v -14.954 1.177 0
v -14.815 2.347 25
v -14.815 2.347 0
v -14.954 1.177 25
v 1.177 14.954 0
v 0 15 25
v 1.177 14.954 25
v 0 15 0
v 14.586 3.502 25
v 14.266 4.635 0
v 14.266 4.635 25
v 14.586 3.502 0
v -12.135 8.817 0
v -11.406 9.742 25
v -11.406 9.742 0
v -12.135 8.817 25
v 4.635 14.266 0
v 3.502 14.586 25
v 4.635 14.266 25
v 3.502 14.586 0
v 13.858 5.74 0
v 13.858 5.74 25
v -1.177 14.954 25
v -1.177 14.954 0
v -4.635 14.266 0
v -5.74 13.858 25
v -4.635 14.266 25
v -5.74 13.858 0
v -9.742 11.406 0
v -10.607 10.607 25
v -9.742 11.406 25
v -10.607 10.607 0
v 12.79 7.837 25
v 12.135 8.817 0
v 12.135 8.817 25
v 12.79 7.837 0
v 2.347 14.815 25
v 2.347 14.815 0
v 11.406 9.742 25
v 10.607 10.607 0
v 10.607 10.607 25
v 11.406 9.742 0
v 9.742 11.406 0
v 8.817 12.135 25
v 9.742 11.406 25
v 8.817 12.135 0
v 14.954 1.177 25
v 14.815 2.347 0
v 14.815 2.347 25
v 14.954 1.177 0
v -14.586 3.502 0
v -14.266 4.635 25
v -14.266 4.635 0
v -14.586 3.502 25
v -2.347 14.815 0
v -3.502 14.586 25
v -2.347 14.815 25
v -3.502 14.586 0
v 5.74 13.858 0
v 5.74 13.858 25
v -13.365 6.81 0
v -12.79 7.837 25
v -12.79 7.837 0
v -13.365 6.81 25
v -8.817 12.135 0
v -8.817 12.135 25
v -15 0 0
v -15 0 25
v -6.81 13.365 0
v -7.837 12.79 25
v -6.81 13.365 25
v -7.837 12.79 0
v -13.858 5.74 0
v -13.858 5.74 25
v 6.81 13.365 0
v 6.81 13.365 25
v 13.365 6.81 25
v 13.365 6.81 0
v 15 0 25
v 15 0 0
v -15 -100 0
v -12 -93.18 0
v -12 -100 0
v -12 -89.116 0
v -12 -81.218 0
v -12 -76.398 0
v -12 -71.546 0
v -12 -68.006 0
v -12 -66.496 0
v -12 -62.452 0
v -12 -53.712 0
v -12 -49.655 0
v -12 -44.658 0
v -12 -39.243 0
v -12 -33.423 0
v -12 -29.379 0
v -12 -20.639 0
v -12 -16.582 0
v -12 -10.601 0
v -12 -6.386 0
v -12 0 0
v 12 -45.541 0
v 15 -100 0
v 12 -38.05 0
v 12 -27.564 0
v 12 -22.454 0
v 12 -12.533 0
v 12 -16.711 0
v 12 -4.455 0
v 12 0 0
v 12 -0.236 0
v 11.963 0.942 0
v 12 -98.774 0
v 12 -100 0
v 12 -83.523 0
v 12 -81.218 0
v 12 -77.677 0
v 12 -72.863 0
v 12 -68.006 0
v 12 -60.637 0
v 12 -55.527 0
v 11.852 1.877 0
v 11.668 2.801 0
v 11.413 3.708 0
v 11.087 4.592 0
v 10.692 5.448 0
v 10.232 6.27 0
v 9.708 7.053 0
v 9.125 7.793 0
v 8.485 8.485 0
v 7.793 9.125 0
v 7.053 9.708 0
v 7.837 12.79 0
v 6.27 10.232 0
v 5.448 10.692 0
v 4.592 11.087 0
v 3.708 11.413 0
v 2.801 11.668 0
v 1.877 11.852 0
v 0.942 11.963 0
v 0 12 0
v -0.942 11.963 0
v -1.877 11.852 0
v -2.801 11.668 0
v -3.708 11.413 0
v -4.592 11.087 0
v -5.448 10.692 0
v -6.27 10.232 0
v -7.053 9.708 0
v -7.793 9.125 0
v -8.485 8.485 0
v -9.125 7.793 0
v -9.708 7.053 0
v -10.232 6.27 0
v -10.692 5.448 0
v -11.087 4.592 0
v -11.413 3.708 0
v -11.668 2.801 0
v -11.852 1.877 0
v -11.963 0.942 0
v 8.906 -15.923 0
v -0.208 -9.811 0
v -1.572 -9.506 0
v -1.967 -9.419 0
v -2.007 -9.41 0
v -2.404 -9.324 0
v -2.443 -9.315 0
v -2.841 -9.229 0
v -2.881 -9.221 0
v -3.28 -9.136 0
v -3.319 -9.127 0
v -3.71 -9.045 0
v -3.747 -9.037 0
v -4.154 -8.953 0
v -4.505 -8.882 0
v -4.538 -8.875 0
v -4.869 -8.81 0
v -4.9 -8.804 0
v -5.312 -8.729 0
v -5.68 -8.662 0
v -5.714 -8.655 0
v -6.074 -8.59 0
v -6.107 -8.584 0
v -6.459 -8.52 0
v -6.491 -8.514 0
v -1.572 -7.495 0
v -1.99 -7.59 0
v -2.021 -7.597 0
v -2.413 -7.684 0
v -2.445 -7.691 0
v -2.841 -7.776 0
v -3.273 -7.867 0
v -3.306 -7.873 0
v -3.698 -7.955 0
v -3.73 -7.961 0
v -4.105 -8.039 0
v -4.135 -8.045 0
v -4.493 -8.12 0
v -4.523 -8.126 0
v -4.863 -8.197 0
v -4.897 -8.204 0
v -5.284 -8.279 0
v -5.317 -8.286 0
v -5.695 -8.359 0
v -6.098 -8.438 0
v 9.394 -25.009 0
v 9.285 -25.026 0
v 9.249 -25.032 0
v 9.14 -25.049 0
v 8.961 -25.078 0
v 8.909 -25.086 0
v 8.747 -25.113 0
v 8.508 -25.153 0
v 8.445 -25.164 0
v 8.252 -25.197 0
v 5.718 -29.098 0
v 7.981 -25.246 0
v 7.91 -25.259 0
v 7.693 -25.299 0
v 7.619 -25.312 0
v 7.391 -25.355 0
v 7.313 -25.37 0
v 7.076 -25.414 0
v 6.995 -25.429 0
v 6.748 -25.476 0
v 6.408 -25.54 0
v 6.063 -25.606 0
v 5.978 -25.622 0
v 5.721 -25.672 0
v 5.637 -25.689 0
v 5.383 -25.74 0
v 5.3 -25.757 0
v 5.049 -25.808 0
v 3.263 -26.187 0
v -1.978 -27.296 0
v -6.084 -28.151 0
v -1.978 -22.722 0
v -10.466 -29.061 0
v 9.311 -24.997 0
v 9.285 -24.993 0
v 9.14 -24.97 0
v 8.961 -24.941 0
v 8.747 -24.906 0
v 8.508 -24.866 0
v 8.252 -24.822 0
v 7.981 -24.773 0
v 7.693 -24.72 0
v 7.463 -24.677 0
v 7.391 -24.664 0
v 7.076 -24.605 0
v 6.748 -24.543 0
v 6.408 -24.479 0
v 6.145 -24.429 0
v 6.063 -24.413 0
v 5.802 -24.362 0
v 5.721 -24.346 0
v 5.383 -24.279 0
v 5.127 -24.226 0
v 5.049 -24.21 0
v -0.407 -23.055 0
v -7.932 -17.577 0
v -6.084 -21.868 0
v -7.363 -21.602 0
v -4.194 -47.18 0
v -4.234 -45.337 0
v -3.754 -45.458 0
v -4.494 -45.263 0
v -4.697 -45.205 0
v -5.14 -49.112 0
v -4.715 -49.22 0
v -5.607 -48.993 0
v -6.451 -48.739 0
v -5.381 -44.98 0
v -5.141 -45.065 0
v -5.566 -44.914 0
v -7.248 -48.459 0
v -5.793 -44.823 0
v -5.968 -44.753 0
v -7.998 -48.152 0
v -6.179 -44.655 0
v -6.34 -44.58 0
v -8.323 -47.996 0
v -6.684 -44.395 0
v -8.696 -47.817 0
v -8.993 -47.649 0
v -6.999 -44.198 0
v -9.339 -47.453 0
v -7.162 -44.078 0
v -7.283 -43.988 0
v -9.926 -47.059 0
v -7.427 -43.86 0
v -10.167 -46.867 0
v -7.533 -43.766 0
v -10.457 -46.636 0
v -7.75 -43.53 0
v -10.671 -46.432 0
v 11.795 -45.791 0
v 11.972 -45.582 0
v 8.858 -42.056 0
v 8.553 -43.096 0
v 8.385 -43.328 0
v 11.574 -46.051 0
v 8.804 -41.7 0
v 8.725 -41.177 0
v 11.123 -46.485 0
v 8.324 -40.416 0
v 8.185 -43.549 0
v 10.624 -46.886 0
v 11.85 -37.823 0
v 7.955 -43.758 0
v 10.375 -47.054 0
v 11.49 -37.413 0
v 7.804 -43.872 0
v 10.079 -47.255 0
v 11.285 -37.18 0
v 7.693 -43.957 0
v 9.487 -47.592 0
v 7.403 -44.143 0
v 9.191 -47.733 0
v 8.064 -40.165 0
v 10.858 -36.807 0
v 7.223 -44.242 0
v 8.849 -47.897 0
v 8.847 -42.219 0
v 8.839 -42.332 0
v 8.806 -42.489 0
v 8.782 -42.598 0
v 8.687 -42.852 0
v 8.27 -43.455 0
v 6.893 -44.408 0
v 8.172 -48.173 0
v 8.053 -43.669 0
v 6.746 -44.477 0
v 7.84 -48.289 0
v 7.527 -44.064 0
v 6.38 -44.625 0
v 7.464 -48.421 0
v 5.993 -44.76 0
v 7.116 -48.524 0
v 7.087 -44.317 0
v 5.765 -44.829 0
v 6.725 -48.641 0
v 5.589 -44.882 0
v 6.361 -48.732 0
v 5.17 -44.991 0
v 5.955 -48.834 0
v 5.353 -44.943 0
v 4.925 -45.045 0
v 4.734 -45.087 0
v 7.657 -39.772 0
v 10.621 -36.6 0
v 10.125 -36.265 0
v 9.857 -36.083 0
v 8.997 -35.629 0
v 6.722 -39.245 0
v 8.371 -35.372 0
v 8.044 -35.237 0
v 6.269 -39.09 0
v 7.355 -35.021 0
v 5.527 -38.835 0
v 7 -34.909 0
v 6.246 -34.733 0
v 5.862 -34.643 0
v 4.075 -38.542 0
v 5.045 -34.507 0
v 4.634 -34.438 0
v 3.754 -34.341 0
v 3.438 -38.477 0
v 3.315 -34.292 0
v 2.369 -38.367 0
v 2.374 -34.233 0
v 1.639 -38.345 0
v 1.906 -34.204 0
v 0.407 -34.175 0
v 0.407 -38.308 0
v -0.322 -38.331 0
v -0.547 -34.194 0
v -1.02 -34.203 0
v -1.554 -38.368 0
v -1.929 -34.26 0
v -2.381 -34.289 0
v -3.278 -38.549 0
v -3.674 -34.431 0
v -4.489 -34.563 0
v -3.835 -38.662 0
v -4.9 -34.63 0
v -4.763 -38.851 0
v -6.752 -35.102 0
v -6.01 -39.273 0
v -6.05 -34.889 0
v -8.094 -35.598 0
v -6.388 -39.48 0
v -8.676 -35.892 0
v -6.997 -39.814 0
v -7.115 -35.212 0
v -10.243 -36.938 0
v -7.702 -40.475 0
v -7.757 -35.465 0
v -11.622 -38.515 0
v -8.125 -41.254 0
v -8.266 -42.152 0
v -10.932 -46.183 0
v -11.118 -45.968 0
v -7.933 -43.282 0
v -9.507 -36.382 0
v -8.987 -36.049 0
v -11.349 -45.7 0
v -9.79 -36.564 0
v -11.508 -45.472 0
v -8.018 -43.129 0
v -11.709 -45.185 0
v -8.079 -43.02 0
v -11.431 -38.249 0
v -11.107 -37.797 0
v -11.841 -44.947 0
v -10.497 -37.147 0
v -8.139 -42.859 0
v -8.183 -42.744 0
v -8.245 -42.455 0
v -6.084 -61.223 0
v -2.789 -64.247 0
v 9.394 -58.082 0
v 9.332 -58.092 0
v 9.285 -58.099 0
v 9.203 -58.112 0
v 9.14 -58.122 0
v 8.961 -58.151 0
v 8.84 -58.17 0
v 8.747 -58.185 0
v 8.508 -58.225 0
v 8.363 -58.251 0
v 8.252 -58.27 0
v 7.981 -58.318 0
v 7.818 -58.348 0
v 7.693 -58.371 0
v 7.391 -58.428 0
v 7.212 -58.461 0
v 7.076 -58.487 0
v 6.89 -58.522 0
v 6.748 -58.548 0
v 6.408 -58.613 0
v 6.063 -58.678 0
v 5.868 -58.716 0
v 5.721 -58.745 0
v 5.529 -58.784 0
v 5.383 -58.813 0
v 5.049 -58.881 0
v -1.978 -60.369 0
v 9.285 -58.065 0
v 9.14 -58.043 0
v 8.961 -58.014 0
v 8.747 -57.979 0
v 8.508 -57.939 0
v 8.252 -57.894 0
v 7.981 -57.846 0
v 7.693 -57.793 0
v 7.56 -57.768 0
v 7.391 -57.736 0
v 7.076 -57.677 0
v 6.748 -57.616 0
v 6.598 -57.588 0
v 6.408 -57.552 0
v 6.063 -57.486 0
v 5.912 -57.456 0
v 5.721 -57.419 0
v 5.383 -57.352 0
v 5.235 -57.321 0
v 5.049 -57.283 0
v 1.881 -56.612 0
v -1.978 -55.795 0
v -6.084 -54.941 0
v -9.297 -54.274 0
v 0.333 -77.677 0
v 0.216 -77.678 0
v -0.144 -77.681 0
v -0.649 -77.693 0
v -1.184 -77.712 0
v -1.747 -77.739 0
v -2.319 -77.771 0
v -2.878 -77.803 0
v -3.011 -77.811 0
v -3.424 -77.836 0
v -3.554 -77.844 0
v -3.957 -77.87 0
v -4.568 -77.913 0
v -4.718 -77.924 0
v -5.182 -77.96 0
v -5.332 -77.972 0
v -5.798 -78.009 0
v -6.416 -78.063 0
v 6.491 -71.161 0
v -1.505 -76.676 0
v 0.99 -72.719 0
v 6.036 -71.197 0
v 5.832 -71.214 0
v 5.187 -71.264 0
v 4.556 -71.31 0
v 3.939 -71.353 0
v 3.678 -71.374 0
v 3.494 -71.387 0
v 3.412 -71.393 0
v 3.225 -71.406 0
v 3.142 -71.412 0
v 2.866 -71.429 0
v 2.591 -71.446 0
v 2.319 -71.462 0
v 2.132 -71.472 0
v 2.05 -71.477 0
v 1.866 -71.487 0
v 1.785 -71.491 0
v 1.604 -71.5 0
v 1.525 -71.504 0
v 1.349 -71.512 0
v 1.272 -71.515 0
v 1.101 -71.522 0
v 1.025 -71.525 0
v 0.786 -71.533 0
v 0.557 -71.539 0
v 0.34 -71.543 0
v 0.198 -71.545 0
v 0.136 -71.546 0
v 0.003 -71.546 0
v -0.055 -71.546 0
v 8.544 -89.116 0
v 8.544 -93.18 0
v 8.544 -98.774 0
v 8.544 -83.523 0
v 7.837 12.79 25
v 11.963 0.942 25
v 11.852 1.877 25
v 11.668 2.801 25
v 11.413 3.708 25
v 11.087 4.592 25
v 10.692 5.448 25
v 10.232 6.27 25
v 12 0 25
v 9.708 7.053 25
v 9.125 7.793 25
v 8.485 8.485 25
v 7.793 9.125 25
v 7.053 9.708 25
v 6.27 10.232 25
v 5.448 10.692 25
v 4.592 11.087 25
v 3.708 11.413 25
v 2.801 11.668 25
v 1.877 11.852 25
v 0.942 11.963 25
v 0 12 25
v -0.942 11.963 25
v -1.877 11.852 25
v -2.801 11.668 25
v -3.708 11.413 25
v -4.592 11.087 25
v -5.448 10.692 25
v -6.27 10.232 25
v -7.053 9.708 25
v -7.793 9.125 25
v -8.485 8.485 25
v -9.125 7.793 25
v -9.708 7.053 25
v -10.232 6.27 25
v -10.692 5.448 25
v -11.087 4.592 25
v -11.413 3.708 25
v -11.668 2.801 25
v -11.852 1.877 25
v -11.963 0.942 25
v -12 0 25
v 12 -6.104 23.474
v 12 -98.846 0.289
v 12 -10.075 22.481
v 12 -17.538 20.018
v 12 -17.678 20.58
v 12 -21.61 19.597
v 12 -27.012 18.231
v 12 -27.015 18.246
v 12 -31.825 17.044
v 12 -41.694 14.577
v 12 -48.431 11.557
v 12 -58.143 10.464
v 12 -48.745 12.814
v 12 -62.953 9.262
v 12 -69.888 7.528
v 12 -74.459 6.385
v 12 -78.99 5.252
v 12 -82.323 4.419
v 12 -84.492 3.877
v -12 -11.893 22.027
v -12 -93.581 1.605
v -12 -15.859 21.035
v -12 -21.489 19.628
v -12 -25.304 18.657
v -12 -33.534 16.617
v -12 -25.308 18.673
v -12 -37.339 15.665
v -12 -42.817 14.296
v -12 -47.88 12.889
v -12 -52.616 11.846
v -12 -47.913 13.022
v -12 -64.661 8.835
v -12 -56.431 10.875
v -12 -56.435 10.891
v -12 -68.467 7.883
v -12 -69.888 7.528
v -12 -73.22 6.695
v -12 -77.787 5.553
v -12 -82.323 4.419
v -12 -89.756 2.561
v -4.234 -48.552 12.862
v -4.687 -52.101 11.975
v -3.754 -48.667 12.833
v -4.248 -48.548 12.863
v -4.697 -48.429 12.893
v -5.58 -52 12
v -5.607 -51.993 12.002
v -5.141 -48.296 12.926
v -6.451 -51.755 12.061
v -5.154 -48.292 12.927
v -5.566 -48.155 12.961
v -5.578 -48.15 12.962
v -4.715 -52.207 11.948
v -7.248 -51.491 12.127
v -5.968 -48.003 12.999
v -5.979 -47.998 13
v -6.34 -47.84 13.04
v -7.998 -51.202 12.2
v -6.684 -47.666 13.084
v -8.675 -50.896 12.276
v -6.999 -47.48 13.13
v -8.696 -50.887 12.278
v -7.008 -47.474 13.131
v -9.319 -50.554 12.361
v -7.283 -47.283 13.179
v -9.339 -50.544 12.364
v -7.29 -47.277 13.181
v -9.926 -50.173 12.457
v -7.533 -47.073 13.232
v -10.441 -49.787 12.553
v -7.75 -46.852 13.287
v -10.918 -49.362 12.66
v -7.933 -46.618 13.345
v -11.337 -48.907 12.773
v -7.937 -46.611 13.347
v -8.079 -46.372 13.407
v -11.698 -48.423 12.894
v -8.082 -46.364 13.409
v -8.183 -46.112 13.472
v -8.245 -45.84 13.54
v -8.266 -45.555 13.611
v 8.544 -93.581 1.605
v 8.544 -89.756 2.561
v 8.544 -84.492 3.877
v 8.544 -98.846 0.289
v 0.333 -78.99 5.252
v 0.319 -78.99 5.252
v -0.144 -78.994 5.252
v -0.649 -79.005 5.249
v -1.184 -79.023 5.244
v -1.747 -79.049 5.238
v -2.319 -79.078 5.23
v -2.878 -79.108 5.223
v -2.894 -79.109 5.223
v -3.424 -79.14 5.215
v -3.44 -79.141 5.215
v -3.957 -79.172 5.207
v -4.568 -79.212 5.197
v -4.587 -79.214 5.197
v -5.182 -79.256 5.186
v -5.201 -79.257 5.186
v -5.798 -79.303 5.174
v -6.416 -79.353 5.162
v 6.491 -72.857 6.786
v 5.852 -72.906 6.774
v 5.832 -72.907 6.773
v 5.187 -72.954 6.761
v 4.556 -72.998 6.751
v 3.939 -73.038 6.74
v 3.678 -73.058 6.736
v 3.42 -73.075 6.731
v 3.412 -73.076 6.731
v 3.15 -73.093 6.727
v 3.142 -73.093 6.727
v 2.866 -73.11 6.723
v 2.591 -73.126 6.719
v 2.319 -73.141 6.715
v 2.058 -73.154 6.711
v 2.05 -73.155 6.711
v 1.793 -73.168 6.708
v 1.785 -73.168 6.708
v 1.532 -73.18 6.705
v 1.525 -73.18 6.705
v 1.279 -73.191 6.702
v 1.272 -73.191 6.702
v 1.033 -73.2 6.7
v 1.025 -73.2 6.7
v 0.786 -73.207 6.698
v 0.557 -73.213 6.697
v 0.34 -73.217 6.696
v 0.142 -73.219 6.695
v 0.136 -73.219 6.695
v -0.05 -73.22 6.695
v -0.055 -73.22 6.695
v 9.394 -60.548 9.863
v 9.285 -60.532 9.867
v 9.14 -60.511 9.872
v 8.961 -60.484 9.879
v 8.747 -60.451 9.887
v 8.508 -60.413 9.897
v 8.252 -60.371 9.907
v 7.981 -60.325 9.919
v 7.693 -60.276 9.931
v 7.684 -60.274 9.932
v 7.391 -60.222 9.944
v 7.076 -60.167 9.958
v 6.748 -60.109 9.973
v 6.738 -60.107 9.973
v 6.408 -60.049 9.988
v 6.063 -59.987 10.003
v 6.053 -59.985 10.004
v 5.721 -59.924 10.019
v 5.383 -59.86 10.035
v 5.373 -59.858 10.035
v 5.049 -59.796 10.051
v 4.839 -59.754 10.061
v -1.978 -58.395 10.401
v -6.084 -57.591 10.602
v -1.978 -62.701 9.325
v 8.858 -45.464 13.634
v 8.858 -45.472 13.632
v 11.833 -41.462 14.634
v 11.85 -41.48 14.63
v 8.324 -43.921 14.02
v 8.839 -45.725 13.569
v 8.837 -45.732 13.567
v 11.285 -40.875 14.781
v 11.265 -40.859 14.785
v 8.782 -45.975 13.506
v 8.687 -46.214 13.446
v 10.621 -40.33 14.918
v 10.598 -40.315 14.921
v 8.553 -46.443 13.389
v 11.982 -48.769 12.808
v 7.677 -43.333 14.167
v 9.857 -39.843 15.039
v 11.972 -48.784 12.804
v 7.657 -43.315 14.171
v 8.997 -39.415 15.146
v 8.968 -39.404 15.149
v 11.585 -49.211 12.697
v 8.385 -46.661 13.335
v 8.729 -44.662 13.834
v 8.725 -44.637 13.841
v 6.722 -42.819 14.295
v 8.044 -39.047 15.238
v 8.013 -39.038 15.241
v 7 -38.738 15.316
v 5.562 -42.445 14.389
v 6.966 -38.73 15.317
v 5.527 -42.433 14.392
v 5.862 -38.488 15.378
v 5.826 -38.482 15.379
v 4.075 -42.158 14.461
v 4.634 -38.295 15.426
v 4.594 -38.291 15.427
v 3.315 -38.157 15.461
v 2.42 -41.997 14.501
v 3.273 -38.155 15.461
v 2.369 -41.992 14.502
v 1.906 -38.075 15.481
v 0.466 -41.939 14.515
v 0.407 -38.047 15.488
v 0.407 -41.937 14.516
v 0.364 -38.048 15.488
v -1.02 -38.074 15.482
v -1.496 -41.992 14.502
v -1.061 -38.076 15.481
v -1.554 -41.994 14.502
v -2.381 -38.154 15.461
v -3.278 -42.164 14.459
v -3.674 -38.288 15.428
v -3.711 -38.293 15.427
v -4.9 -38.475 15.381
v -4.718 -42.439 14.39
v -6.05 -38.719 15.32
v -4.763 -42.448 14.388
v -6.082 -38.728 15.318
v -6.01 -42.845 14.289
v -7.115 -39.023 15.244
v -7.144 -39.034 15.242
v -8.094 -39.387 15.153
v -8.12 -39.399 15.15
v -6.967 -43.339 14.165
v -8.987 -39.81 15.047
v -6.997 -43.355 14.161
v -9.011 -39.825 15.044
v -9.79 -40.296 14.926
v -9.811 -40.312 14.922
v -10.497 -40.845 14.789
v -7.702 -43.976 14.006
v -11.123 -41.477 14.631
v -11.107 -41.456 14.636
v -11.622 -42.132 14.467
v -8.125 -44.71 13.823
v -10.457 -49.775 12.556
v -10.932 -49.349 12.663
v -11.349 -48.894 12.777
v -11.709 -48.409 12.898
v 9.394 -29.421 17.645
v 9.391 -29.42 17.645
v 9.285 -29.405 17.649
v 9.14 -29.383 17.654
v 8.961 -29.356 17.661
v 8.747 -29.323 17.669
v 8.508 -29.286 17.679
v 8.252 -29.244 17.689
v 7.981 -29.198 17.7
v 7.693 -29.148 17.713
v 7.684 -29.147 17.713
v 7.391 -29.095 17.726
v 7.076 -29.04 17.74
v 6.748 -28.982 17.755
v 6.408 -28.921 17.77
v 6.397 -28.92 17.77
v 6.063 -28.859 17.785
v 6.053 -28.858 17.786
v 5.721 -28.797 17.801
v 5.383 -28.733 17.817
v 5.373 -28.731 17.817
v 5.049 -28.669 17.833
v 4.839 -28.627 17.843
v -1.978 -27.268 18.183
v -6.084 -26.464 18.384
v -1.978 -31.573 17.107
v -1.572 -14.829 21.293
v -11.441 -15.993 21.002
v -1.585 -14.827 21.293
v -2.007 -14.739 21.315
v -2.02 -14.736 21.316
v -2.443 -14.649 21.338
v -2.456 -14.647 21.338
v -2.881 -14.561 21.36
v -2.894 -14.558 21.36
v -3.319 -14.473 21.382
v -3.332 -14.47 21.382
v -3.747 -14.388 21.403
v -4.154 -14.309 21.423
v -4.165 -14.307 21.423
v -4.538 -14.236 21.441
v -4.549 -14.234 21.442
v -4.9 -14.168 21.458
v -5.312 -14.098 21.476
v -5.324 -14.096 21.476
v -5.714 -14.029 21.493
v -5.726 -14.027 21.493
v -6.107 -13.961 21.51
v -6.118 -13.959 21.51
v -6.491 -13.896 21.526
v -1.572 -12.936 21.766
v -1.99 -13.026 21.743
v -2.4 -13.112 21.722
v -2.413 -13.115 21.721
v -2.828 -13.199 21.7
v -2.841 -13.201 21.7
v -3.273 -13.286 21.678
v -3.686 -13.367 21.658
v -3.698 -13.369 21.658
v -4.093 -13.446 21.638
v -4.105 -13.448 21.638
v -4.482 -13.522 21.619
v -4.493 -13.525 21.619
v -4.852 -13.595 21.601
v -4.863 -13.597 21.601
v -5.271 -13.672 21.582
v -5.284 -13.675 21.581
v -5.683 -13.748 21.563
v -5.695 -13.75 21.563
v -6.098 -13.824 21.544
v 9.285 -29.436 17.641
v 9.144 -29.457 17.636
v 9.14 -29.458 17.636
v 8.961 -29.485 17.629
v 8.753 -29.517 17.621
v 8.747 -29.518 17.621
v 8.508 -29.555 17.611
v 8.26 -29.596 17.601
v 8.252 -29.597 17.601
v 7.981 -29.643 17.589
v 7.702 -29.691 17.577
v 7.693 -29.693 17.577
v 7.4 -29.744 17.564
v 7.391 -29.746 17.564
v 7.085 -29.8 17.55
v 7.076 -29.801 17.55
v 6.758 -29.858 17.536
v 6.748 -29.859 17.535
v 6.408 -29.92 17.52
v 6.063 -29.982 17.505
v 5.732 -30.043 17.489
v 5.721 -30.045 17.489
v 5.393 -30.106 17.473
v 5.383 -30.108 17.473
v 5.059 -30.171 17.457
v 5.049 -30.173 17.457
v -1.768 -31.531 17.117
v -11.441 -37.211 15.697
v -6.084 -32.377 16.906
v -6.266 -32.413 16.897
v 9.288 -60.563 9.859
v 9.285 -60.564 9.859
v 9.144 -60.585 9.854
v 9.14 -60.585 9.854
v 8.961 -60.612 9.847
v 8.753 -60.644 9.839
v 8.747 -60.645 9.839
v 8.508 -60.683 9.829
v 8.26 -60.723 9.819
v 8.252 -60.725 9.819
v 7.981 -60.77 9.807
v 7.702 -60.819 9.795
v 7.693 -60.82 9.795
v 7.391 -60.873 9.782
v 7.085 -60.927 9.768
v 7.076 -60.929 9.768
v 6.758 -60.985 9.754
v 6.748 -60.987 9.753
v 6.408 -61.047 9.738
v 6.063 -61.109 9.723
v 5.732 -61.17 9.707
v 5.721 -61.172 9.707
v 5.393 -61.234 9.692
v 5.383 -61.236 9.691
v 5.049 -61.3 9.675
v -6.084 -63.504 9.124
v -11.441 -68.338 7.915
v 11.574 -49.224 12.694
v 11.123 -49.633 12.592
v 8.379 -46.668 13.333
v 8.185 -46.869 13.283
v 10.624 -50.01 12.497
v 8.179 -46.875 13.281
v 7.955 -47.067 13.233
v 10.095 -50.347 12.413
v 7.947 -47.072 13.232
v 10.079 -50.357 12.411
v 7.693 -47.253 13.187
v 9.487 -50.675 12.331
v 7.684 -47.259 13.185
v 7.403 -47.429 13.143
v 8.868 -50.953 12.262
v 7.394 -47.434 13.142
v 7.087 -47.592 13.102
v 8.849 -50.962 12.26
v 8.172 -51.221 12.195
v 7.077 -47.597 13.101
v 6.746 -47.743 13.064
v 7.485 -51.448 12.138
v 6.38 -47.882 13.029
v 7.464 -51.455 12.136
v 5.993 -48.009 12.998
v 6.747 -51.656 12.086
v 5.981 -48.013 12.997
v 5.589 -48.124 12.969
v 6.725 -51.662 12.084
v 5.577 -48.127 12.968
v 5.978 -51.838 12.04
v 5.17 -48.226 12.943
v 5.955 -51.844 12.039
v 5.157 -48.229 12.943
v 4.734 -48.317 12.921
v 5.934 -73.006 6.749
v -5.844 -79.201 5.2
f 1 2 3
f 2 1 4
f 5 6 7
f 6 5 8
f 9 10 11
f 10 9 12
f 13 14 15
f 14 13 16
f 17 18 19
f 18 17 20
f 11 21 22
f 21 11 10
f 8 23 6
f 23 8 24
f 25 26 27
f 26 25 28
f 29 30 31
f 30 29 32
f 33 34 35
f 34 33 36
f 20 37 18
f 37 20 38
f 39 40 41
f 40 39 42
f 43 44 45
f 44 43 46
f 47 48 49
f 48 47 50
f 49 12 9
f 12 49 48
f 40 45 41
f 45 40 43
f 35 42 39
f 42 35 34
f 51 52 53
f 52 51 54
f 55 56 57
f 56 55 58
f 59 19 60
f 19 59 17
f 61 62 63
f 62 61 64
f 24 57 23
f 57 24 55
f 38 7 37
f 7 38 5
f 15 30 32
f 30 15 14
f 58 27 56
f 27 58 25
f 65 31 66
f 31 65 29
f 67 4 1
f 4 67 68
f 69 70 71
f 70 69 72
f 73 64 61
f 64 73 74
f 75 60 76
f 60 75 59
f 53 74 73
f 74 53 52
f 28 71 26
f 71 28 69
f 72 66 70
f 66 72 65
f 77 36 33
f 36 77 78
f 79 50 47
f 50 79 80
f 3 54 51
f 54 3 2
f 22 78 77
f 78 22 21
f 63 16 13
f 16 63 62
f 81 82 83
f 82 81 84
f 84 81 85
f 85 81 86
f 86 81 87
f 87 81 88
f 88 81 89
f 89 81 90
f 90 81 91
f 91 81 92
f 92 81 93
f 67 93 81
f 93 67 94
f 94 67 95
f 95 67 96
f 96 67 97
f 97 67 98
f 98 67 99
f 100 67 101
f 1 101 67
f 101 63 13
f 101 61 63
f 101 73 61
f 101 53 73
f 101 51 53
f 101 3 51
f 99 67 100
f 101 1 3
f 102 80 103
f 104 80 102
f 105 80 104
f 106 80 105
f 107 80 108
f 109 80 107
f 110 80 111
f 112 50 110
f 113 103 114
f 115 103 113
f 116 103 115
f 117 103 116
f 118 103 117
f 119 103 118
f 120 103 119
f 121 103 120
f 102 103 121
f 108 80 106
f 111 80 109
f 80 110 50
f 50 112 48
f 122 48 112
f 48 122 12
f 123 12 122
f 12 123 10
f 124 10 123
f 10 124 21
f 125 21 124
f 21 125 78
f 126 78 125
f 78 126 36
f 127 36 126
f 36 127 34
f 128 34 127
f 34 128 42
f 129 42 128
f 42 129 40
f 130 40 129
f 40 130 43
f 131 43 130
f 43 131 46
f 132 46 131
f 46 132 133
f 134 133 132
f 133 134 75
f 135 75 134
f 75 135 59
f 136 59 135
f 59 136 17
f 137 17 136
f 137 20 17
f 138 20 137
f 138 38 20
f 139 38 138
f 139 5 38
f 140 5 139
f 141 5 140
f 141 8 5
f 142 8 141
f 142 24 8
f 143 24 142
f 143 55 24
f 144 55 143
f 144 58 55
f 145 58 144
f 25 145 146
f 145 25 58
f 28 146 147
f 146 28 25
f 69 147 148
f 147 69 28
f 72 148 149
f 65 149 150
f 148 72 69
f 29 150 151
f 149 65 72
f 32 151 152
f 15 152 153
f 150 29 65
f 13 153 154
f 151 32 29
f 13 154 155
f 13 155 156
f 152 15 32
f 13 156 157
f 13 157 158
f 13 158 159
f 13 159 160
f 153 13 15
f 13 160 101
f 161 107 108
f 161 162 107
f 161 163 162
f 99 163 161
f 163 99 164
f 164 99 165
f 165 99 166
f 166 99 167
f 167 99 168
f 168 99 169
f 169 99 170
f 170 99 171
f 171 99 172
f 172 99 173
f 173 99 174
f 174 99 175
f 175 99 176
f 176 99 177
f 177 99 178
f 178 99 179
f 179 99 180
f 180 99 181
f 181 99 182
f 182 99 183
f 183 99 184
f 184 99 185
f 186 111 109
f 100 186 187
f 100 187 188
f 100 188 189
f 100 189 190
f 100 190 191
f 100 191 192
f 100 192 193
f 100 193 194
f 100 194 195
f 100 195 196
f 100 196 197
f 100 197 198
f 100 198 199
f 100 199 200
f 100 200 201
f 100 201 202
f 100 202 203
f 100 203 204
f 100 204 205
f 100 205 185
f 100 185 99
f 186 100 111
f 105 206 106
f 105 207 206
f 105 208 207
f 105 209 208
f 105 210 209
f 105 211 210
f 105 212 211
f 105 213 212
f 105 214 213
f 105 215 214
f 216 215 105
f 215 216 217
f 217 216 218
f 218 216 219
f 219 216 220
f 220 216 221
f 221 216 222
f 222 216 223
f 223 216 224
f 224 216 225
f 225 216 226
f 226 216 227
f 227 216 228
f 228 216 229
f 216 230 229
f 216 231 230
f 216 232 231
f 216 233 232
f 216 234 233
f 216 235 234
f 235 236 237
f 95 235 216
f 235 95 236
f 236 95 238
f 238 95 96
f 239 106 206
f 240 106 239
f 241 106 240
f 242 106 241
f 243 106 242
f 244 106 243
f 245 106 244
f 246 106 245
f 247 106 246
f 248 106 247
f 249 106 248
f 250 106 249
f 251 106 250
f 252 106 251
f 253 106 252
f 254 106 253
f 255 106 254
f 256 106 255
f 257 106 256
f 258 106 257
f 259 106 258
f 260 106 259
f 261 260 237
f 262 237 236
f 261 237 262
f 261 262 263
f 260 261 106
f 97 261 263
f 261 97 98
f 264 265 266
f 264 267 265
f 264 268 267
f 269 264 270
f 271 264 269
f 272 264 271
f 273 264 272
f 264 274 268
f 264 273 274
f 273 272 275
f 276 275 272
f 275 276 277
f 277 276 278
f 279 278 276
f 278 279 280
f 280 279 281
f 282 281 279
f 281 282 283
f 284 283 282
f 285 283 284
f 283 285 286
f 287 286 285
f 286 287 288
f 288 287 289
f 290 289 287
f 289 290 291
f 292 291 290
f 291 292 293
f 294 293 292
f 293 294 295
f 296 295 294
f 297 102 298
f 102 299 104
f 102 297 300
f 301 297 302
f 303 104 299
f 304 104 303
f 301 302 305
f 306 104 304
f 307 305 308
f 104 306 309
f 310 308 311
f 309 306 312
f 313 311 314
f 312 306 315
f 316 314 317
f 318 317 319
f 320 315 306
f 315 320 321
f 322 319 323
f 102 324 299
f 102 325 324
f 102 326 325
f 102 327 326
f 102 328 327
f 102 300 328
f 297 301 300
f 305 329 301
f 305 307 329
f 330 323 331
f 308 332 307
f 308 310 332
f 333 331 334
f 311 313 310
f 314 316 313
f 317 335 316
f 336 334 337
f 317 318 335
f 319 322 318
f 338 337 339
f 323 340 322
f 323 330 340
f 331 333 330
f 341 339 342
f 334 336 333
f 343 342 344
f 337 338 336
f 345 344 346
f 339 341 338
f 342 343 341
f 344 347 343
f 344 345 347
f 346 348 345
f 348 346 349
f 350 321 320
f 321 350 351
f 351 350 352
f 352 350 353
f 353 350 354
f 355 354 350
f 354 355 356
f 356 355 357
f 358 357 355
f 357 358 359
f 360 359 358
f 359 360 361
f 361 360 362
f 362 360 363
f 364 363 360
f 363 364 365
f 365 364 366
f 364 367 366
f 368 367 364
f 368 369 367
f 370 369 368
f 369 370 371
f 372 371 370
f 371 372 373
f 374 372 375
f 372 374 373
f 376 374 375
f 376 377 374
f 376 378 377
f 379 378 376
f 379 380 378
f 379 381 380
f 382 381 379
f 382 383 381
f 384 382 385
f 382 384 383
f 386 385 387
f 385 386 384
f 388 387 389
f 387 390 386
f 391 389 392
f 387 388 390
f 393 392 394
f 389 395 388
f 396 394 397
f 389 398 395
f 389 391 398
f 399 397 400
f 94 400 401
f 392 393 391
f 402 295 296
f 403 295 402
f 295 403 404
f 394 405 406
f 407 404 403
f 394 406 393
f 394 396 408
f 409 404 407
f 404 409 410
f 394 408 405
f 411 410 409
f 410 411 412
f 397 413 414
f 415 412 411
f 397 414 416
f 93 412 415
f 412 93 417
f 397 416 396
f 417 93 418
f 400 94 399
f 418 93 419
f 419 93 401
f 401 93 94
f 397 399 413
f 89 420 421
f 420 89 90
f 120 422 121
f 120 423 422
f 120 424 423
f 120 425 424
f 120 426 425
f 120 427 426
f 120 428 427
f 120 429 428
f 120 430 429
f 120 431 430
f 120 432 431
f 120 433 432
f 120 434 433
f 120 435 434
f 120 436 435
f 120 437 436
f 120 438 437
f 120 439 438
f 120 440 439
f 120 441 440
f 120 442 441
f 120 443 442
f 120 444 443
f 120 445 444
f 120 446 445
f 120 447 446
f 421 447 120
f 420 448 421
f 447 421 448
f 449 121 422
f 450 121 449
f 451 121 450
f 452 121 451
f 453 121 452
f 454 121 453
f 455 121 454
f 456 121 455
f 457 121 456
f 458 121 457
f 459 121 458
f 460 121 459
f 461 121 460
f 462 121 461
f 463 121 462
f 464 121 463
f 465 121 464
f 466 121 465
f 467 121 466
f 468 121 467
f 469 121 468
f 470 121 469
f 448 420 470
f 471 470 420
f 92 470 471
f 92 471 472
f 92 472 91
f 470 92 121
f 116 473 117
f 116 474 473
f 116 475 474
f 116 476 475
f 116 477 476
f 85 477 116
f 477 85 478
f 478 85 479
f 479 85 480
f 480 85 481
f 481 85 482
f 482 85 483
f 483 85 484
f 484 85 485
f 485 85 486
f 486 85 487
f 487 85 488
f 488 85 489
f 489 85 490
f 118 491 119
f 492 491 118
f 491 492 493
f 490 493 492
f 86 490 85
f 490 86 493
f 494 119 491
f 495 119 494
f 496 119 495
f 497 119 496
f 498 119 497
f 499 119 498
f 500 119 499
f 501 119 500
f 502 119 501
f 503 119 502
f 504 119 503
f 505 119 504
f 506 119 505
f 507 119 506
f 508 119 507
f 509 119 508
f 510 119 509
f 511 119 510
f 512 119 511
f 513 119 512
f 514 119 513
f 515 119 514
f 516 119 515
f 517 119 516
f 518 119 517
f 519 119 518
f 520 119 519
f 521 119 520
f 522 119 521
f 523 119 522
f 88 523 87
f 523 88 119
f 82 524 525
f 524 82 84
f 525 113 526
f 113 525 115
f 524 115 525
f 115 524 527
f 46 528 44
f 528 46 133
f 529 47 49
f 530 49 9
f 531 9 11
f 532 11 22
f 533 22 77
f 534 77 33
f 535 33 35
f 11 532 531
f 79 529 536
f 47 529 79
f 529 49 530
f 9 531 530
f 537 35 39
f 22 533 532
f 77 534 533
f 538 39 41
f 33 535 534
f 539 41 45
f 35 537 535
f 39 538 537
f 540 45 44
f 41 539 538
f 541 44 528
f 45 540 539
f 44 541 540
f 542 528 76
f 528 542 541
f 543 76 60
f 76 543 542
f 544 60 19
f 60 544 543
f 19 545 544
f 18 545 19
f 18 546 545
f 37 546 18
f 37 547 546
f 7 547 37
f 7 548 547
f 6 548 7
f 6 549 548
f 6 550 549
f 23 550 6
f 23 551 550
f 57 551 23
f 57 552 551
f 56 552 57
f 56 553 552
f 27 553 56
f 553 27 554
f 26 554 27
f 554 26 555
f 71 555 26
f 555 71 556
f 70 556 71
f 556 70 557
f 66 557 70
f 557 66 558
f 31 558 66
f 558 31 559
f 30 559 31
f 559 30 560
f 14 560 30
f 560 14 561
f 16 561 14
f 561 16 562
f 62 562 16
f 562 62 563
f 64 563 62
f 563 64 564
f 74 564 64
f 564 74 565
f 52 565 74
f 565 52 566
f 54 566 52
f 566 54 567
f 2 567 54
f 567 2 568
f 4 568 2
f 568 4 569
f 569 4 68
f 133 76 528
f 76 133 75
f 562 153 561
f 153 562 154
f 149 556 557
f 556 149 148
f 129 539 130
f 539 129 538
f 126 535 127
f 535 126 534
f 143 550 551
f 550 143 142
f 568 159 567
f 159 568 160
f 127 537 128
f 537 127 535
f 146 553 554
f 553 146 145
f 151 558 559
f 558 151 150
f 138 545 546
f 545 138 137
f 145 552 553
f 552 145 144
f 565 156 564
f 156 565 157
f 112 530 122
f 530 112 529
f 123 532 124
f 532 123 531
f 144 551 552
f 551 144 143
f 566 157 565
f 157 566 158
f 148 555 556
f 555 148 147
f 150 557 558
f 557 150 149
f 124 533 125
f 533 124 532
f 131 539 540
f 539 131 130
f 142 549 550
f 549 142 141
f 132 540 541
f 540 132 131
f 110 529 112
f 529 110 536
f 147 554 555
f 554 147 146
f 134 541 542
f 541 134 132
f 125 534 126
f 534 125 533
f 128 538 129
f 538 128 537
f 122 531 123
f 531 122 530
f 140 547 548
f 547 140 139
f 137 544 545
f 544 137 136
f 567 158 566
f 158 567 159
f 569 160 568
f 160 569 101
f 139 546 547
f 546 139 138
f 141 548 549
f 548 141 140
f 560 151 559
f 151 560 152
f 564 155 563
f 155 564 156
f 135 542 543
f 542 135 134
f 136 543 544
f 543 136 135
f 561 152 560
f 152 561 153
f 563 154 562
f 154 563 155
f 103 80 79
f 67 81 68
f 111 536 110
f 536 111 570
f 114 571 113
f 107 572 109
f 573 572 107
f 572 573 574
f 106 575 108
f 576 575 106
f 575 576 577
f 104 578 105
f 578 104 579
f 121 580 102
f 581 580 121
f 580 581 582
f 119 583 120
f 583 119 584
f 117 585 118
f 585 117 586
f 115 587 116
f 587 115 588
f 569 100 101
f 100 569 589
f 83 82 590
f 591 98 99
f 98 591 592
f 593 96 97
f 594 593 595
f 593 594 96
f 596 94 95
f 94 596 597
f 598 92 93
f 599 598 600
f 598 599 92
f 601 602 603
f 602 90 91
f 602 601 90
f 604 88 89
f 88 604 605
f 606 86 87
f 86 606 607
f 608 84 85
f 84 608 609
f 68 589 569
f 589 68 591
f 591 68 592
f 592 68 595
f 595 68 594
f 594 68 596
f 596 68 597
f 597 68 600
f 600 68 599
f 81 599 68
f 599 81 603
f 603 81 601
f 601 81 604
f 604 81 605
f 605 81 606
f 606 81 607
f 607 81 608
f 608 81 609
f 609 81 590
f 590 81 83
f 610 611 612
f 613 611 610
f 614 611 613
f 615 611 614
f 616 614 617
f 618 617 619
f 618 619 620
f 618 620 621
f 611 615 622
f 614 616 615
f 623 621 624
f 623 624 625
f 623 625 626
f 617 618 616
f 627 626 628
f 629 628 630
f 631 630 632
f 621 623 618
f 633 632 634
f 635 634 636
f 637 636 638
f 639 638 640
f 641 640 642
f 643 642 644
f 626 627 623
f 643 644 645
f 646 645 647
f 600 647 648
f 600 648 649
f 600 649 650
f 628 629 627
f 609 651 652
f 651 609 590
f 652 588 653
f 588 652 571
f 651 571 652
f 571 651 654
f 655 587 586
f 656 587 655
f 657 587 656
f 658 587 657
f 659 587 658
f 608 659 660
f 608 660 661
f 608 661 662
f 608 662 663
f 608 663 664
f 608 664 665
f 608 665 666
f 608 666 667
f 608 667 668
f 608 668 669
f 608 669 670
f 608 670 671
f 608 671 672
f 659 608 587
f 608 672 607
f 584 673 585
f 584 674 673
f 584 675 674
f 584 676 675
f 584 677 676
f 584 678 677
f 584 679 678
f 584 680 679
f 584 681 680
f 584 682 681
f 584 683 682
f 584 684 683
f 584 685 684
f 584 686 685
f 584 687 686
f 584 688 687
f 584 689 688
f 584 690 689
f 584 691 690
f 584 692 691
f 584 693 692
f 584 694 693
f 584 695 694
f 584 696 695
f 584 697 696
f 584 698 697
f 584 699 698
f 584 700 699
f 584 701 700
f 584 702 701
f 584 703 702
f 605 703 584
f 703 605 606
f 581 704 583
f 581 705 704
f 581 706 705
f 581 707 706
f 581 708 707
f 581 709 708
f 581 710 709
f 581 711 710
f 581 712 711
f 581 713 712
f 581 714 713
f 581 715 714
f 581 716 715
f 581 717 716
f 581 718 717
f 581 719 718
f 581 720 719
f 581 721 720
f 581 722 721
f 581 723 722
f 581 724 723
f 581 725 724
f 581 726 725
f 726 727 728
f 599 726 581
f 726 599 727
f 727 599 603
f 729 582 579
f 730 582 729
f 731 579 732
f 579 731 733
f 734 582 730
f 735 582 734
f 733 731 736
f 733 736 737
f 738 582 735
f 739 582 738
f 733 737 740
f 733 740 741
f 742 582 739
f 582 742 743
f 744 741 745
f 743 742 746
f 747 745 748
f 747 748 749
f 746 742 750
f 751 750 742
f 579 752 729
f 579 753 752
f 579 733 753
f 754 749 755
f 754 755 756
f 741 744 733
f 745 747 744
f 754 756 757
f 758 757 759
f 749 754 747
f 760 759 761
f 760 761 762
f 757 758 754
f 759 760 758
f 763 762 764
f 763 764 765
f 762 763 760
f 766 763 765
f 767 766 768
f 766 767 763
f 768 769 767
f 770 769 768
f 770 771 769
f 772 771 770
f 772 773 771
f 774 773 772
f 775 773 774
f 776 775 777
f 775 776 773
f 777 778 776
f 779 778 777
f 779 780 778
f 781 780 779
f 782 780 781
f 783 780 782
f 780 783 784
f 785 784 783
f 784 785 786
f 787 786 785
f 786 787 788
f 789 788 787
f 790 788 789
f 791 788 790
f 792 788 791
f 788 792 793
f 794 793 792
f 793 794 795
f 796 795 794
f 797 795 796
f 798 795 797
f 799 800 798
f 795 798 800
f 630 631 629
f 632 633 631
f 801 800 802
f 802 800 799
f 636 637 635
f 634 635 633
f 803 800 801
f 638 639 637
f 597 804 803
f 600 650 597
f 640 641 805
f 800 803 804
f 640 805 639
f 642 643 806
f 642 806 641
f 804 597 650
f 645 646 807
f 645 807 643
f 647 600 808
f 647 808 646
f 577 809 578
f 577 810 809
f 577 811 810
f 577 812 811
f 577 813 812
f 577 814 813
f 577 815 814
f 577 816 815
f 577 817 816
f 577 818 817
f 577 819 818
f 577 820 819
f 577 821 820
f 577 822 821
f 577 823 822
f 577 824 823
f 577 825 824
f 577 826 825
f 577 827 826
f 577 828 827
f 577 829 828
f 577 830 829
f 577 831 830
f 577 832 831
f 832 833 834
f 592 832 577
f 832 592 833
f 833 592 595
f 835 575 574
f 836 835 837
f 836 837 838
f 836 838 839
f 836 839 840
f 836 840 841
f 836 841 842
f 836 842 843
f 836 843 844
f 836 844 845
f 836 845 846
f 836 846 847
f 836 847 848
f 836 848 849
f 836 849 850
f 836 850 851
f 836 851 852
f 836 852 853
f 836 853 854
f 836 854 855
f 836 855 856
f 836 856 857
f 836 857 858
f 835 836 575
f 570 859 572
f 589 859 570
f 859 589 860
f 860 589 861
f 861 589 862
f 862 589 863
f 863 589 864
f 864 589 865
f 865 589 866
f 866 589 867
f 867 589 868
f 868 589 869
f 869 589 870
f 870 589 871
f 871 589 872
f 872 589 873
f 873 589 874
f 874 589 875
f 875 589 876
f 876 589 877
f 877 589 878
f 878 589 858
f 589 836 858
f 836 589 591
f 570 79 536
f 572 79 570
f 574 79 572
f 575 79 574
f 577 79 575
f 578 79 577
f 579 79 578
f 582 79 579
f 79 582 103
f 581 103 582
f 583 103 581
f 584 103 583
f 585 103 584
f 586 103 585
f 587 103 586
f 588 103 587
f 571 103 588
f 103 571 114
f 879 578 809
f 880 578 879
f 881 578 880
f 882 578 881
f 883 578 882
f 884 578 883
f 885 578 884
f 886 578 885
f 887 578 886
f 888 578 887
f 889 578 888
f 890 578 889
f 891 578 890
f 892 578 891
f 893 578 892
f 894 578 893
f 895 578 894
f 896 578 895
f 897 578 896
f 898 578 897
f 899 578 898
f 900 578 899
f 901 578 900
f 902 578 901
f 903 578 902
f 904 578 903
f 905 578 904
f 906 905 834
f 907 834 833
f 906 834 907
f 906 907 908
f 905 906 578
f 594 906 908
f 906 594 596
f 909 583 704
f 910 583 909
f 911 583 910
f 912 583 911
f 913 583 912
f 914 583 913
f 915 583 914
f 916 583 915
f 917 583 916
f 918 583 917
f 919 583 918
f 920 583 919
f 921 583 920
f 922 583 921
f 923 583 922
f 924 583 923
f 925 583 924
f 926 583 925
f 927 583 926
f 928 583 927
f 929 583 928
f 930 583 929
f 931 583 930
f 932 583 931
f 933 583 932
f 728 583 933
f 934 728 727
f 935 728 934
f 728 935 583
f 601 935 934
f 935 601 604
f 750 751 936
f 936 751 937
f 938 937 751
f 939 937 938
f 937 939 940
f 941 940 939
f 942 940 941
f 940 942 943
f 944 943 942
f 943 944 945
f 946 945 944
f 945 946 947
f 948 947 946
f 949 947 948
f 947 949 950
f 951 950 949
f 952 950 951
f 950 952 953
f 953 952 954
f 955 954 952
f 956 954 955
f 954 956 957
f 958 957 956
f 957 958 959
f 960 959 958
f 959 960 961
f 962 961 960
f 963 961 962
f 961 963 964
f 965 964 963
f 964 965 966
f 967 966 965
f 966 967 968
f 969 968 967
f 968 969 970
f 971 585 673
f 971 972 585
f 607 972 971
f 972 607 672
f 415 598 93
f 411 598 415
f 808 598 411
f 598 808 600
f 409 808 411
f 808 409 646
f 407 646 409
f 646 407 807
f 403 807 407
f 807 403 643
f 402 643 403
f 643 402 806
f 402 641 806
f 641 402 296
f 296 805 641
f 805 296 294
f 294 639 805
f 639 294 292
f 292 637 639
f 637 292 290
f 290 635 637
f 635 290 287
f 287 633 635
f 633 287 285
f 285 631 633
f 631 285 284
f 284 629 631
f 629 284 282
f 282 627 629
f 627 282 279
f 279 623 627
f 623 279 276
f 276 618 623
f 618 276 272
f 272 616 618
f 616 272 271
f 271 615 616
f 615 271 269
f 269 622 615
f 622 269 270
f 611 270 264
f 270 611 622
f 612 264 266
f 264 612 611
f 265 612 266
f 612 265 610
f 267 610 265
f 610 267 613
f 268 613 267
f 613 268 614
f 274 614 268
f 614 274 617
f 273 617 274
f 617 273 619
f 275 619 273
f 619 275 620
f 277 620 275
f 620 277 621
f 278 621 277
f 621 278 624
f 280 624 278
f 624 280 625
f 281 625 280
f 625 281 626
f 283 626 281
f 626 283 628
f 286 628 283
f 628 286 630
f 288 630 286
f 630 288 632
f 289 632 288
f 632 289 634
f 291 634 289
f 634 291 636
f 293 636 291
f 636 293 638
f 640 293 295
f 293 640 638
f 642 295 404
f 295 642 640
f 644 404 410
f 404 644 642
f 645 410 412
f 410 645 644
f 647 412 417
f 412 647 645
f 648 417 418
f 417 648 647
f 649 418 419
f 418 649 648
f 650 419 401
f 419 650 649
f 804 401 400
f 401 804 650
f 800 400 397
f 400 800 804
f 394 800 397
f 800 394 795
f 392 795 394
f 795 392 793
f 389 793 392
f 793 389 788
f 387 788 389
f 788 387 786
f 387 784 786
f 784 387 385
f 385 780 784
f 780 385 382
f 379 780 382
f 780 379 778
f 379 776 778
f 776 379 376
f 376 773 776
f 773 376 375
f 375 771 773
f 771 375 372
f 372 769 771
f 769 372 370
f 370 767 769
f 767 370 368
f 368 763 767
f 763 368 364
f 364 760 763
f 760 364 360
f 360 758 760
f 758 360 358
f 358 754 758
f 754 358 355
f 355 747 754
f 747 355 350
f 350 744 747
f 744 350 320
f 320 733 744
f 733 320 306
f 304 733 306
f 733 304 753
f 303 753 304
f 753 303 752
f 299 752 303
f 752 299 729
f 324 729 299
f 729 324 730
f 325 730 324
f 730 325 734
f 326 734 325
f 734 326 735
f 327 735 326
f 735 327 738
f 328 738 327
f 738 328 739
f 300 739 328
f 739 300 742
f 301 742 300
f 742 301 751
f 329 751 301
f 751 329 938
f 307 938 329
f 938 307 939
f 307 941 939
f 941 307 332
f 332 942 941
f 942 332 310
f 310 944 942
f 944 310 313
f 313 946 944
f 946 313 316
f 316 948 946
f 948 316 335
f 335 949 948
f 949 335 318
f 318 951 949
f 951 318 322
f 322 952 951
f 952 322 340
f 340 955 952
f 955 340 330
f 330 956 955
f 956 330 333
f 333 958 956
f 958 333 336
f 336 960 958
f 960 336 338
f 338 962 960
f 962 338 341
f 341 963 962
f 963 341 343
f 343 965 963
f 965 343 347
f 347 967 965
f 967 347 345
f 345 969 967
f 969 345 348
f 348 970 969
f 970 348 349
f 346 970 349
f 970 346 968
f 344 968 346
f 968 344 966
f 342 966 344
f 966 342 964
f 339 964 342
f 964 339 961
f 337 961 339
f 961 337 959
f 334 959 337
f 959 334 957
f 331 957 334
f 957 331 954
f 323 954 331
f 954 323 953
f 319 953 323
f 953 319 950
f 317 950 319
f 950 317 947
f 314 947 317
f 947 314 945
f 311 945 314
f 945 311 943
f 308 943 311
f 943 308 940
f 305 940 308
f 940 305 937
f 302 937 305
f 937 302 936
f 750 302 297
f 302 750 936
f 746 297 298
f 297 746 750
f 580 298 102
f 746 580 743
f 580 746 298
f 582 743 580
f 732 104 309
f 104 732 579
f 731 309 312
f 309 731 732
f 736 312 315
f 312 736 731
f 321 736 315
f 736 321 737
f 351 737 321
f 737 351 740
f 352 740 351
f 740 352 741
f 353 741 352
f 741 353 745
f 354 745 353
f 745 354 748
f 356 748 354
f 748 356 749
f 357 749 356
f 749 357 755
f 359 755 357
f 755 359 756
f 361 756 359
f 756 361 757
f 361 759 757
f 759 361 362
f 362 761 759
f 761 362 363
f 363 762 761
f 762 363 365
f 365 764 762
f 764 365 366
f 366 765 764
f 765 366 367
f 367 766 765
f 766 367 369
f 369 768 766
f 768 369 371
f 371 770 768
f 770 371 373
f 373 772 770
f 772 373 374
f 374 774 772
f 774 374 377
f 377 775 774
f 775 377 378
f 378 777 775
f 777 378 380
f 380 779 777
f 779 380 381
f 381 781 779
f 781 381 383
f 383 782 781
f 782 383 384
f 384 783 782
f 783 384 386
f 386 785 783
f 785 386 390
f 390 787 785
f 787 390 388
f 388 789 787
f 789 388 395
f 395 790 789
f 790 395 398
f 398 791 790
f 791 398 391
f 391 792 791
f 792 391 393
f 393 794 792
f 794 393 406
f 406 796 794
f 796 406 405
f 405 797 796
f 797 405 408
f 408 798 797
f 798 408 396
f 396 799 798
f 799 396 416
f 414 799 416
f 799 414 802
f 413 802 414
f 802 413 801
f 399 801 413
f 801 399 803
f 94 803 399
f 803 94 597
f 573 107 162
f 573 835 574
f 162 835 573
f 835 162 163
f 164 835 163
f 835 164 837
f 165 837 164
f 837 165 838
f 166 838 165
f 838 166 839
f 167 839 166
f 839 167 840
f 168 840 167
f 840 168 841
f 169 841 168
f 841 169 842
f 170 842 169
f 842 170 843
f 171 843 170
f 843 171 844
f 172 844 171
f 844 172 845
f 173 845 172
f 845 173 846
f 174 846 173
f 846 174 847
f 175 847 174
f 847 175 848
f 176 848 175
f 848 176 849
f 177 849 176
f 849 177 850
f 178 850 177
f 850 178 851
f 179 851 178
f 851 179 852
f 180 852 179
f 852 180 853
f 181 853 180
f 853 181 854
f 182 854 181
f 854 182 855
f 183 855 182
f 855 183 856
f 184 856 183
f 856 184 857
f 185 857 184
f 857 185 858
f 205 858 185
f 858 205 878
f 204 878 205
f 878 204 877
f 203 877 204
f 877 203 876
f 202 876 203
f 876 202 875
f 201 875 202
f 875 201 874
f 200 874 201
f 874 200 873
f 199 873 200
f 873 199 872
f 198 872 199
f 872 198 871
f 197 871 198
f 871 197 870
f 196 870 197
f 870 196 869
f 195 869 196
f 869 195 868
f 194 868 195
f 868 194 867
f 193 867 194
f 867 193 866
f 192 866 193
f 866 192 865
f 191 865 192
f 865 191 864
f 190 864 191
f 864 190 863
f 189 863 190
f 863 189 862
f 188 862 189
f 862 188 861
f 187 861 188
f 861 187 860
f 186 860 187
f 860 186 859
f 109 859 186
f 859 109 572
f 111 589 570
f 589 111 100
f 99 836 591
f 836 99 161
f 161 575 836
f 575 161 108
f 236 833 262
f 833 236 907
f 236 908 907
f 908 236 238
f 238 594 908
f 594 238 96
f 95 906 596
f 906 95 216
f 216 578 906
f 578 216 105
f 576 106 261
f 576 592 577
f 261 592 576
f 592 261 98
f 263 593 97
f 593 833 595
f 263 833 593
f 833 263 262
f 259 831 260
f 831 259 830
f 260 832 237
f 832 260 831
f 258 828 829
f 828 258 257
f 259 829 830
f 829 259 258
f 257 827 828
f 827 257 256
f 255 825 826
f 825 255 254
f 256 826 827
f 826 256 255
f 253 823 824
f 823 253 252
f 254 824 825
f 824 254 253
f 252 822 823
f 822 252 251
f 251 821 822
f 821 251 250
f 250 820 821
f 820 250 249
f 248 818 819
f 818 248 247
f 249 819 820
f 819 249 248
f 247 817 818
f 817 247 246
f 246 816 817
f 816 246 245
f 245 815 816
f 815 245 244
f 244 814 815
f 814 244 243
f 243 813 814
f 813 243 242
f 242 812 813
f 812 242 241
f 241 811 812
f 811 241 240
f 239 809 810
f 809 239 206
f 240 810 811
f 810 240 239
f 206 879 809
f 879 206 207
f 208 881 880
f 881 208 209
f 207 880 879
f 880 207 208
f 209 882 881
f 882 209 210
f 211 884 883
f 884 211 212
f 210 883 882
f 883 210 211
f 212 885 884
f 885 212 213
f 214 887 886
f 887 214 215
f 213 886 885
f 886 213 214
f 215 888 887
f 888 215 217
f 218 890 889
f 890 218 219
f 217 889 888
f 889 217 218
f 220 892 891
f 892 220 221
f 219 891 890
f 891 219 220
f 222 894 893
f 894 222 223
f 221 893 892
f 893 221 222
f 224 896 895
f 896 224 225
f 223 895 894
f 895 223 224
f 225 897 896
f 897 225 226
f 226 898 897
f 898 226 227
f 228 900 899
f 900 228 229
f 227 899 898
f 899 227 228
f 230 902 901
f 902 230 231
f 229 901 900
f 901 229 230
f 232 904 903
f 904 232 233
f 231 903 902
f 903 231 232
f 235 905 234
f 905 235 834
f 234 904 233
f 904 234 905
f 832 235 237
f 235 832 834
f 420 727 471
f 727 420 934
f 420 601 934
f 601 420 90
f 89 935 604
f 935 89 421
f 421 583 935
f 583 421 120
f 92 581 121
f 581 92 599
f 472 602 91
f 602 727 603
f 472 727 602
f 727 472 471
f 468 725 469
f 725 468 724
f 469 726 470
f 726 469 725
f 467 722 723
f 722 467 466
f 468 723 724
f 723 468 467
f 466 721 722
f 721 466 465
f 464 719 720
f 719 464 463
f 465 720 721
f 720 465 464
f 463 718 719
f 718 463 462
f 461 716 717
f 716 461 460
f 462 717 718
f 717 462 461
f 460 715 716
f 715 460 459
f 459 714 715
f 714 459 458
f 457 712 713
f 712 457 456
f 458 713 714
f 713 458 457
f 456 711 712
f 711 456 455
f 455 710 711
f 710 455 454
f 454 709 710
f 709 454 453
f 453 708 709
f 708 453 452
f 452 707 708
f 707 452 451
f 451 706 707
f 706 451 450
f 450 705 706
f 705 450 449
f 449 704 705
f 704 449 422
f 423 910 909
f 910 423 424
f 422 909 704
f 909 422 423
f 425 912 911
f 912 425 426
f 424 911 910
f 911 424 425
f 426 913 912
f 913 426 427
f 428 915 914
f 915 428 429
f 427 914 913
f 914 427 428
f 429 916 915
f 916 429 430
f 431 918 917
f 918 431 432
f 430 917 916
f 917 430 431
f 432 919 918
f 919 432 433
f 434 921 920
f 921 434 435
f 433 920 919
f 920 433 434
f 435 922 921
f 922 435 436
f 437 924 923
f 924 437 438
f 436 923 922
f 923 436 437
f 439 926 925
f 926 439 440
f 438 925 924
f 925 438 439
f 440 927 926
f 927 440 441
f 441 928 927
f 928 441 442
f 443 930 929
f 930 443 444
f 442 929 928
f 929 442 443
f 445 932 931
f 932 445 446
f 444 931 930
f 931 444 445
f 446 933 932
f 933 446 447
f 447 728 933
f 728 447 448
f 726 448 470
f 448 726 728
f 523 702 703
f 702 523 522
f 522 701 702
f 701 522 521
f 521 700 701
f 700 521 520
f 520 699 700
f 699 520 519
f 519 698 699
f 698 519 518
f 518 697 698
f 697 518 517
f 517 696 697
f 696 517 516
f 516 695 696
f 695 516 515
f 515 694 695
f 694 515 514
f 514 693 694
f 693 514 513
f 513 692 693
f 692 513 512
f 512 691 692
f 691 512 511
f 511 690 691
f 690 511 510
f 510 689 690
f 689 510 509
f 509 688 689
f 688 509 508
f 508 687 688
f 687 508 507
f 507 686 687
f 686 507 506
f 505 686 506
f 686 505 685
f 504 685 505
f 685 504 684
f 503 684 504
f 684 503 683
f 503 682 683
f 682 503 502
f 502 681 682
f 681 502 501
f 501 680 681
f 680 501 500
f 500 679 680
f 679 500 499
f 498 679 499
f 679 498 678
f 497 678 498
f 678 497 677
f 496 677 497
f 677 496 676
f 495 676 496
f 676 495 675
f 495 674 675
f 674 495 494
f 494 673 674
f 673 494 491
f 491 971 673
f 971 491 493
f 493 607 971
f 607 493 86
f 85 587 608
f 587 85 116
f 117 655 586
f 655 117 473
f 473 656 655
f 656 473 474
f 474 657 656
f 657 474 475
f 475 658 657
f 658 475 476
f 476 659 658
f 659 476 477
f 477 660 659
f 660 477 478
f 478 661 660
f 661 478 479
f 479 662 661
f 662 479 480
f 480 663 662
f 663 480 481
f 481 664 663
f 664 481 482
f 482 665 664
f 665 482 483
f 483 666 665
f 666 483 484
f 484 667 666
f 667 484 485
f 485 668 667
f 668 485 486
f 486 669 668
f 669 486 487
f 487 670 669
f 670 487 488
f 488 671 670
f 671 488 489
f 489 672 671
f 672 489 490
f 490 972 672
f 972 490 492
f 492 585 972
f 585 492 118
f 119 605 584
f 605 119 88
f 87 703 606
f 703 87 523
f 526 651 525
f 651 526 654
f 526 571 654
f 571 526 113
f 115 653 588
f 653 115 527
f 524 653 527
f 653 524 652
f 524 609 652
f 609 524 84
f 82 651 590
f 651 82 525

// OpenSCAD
// Author: Neon22
// July 2018

// preview[view:south west, tilt:top diagonal]

/* [Parameters] */
Wedge_length = 100; // [50:300]
Wedge_width  = 30;  // [10:60]
Wedge_height = 25;  // [5:100]
Wall_thickness = 3; // [0.5:5]

/* [Text] */
Word       = "VACANT";
Word_font  = "Liberation Mono";
Word_style = "Bold"; // [Regular,Bold,Bold Italic,Italic,Condensed,Oblique,Extra Light]

/* [Adjust] */
// Adjust to fit the length
Word_stretch = 0.73;
// Adjust so word hits both sides.
Word_adjust  = 1.01; // [0.9:0.01:1.2]
// Tilt word so its flat on slope.
Tilt_word    = true;

/* [Hidden] */
word_angle = Tilt_word ? tilt() : 0;
font_description = str(Word_font,":style=",Word_style);
//
Delta = 0.1;
cyl_res = 80;

	
//----------------------
// what angle for slope - based on length
function tilt() = atan2(Wedge_height,Wedge_length);

// clip out the top of the wedge
module clip_angle() {
	translate([0,-Delta,Wedge_height/2])
	rotate([0,tilt(),0])
		cube(size=[Wedge_length*1.5,Wedge_width+Delta*2, Wedge_height*2]);
}

// clip excess text from the base
module clip_base() {
	translate([0,-Wedge_width,-Wedge_height*2.5])
		cube(size=[Wedge_length*1.5,Wedge_width*2+Delta*2, Wedge_height*2]);
}

module basic_wedge () {
	// round bit
	difference() {
		// outer cyl
		cylinder(r=Wedge_width/2, h=Wedge_height, $fn=cyl_res, center=true);
		// inner cyl
		cylinder(r=Wedge_width/2-Wall_thickness, h=Wedge_height+Delta*2, $fn=cyl_res, center=true);
		// cutoff RHS
		translate([0,-Wedge_width/2,-Wedge_height/2-Delta])
			cube(size=[Wedge_length,Wedge_width+Delta*2, Wedge_height+Delta*2]);
	}
	// long bit
	translate([0,-Wedge_width/2,-Wedge_height/2])
		difference() {
			// outer cube
			cube(size=[Wedge_length,Wedge_width,Wedge_height]);
			// inner cube
			translate([-Delta,Wall_thickness,-Delta])
				cube(size=[Wedge_length+Delta*2,Wedge_width-Wall_thickness*2,Wedge_height+Delta*2]);
			// angle clip
			translate([0,0,Wedge_height/2])
				clip_angle();
		}
}

// Text
module base_text(tilt=0) {
	translate([0,0,-Wedge_height/2])
	rotate([0,tilt,0])
	scale([Word_stretch,Word_adjust,1])
	linear_extrude(height=Wedge_height, convexity=4)
		text(Word, size=Wedge_width-Wall_thickness, valign="center", font=font_description);
}

module clipped_text() {
	difference() {
		base_text(word_angle);
		translate([0,-Wedge_width/2,0])
			clip_angle();
		clip_base();
	}
}

//---------------------
rotate([0,0,-90])
translate([0,0,Wedge_height/2]) {
	basic_wedge();
	clipped_text();
}
